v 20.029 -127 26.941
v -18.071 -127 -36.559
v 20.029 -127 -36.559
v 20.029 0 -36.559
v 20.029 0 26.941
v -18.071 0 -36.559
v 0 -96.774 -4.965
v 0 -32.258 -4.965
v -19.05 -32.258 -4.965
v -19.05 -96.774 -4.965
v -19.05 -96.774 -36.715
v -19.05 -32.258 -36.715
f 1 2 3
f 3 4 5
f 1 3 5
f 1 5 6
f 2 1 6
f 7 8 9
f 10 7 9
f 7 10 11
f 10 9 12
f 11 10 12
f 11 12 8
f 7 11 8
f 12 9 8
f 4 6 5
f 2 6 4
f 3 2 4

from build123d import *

# Parameters (mm, degrees)
F1_DEPTH = 127
F3_START = 32.258
F3_DEPTH = 64.516


with BuildPart() as f1:
    # F0 (on Front) → F1 (new body)
    with BuildSketch(Plane.XZ):
        Polygon((-18.0714745075, -36.5593432561), (20.0285254925, -36.5593432561), (20.0285254925, 26.9406567439), align=None)
    extrude(amount=F1_DEPTH)


with BuildPart() as f3:
    # F2 (on Front) → F3 (new body)
    with BuildSketch(Plane.XZ.offset(F3_START)):
        Polygon((-19.05, -4.9654923324), (-19.05, -36.7154923324), (0, -4.9654923324), align=None)
    extrude(amount=F3_DEPTH)


solid = Compound([f1.part, f3.part])
